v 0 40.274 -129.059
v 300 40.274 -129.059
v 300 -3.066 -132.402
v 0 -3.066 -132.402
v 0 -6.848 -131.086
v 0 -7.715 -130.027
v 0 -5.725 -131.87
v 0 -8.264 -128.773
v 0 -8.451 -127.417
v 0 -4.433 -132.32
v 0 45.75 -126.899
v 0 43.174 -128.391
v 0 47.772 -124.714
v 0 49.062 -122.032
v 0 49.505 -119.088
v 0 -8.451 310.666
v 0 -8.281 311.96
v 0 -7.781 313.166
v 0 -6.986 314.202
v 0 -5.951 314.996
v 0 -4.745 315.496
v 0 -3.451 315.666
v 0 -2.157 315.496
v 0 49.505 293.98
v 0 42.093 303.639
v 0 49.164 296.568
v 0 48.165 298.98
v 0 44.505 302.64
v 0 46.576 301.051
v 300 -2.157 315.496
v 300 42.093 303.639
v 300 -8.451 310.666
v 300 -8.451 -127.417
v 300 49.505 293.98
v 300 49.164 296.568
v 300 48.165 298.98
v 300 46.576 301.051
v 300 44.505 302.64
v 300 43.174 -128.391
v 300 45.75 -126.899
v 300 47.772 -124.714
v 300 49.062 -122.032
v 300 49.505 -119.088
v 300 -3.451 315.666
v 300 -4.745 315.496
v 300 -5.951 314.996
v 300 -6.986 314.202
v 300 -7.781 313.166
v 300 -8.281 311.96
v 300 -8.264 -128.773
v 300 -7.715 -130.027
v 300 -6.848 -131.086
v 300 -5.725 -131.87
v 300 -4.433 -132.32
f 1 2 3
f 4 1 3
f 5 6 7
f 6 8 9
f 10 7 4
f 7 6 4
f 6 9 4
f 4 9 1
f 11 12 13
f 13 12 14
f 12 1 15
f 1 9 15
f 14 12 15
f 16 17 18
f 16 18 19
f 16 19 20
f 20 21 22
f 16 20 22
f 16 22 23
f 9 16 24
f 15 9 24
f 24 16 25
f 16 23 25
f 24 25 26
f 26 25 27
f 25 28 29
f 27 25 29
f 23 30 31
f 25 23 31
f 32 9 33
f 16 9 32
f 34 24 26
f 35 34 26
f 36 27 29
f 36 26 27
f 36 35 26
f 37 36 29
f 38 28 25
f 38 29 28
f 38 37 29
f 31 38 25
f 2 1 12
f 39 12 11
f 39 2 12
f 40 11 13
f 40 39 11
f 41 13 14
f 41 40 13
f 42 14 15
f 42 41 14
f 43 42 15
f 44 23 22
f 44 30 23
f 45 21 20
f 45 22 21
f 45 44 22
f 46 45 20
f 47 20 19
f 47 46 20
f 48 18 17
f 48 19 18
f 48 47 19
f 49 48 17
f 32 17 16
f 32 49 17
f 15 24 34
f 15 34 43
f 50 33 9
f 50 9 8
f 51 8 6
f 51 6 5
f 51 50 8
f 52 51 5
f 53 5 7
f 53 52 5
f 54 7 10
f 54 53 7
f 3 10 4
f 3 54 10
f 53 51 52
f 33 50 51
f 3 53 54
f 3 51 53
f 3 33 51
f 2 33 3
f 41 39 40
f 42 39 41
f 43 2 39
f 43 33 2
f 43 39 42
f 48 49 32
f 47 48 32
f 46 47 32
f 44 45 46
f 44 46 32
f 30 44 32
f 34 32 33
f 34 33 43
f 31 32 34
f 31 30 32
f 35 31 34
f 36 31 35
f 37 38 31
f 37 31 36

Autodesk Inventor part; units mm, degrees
ref_plane "YZ Plane" through (0, 0, 0) normal (1, 0, 0) x (0, 1, 0)
ref_plane "XZ Plane" through (0, 0, 0) normal (0, 1, 0) x (-1, 0, 0)
ref_plane "XY Plane" through (0, 0, 0) normal (0, 0, 1) x (1, 0, 0)
sketch "Sketch1" plane through (0, 0, 0) normal (1, 0, 0) x (0, 1, 0)
  line L0 (-8.4509, -132.8176) -> (-8.4509, 317.1824)
  line L1 (-8.4509, 317.1824) -> (49.5047, 301.6533)
  line L2 (-8.4509, 317.1824) -> (51.5491, 317.1824) construction
  line L3 (49.5047, 301.6533) -> (49.5047, -128.3467)
  line L4 (49.5047, -128.3467) -> (-8.4509, -132.8176)
  point P0 (0, 0)
  dimension "d0" = 450
  dimension "d1" = 60
  dimension "d2" = 15
  dimension "d3" = 430
extrude "Extrusion1" add sketch "Sketch1" along normal blind 300
fillet "Fillet1" radius 5 2 edges at (150, -8.4509, 317.1824) (150, -8.4509, -132.8176)
fillet "Fillet2" radius 10 2 edges at (150, 49.5047, 301.6533) (150, 49.5047, -128.3467)
properties part number "Chassisew" material "Iron, Gray"
